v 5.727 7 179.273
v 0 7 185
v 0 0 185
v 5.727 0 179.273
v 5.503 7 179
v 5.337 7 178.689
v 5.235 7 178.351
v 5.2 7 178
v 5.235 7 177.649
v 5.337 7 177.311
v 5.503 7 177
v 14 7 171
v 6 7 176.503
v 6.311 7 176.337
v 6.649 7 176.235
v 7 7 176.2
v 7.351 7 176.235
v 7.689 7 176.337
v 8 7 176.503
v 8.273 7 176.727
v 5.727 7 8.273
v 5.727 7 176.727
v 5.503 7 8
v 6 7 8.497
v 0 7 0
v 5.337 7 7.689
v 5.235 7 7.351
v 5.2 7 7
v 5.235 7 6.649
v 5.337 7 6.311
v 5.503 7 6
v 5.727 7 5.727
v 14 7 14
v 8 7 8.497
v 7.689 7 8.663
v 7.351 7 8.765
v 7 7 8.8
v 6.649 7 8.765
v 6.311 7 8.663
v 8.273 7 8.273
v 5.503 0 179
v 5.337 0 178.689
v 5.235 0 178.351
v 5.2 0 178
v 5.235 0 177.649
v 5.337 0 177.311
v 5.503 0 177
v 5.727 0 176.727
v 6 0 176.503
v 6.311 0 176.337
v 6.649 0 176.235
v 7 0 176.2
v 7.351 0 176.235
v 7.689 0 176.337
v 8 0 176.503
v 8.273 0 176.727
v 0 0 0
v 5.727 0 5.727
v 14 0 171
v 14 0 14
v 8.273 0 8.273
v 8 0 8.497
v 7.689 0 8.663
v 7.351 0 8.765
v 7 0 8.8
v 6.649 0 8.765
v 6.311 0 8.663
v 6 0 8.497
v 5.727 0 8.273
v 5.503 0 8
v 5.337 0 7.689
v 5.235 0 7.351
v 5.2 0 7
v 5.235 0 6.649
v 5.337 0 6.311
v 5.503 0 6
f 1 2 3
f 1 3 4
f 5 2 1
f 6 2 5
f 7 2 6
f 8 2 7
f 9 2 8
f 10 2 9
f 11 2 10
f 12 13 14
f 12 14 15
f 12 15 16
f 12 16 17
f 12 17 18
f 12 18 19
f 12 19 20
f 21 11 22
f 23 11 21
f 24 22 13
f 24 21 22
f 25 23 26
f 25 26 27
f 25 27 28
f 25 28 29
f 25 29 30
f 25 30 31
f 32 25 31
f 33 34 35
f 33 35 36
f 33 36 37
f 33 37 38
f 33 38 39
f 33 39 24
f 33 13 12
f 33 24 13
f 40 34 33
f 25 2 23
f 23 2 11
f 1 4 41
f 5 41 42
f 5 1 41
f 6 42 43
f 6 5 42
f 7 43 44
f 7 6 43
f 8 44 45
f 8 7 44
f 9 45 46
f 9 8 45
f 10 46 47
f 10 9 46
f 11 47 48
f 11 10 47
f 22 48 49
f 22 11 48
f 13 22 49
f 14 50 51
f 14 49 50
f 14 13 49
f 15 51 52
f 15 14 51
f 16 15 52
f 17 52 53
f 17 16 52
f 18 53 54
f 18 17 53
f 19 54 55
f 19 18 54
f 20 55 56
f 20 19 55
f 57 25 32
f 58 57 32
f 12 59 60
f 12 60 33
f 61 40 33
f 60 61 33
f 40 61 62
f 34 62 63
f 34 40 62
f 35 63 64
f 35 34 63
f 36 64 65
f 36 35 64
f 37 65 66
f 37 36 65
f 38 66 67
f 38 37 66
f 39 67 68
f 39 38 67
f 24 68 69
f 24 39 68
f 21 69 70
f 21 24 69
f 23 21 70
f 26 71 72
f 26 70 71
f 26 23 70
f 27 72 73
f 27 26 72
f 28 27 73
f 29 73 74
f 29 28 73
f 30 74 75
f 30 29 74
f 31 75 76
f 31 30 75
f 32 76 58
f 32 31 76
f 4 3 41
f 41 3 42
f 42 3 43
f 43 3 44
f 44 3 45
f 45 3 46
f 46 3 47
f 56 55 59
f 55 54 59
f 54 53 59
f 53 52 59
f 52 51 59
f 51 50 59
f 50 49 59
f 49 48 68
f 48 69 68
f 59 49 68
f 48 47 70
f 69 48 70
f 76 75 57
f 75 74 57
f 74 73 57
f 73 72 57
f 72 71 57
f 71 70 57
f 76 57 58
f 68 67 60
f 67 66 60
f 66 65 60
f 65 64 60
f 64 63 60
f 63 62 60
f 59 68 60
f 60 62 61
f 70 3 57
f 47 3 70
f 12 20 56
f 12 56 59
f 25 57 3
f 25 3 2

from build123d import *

# Parameters (mm, degrees)
SKETCH1_W           = 14
SKETCH1_H           = 7
BOSS_EXTRUDE1_DEPTH = 185
CUT_EXTRUDE1_DEPTH  = 186.660981361
CUT_EXTRUDE2_DEPTH  = 186.660981361


with BuildPart() as part:
    # Sketch1 → Boss-Extrude1 (new body)
    with BuildSketch(Plane.XY):
        with Locations((7, 3.5)):
            Rectangle(SKETCH1_W, SKETCH1_H)
    extrude(amount=BOSS_EXTRUDE1_DEPTH)

    # Sketch2 → Cut-Extrude1 (cut, through all)
    with BuildSketch(Plane(origin=(0, 7, 0), x_dir=(1, 0, 0), z_dir=(0, 1, 0))):
        Polygon((0, 0), (14, -14), (14, 0), align=None)
        Polygon((14, -185), (0, -185), (14, -171), align=None)
    extrude(amount=-CUT_EXTRUDE1_DEPTH, mode=Mode.SUBTRACT)

    # Sketch3 → Cut-Extrude2 (cut, through all)
    with BuildSketch(Plane(origin=(0, 7, 0), x_dir=(1, 0, 0), z_dir=(0, 1, 0))):
        with BuildLine():
            Line((8.272792206, -176.727207794), (5.727207794, -179.272792206))
            ThreePointArc((5.727207794, -179.272792206), (5.727207794, -176.727207794), (8.272792206, -176.727207794))
        make_face()
        with BuildLine():
            Line((5.727207794, -5.727207794), (8.272792206, -8.272792206))
            ThreePointArc((8.272792206, -8.272792206), (5.727207794, -8.272792206), (5.727207794, -5.727207794))
        make_face()
    extrude(amount=-CUT_EXTRUDE2_DEPTH, mode=Mode.SUBTRACT)


solid = part.part
